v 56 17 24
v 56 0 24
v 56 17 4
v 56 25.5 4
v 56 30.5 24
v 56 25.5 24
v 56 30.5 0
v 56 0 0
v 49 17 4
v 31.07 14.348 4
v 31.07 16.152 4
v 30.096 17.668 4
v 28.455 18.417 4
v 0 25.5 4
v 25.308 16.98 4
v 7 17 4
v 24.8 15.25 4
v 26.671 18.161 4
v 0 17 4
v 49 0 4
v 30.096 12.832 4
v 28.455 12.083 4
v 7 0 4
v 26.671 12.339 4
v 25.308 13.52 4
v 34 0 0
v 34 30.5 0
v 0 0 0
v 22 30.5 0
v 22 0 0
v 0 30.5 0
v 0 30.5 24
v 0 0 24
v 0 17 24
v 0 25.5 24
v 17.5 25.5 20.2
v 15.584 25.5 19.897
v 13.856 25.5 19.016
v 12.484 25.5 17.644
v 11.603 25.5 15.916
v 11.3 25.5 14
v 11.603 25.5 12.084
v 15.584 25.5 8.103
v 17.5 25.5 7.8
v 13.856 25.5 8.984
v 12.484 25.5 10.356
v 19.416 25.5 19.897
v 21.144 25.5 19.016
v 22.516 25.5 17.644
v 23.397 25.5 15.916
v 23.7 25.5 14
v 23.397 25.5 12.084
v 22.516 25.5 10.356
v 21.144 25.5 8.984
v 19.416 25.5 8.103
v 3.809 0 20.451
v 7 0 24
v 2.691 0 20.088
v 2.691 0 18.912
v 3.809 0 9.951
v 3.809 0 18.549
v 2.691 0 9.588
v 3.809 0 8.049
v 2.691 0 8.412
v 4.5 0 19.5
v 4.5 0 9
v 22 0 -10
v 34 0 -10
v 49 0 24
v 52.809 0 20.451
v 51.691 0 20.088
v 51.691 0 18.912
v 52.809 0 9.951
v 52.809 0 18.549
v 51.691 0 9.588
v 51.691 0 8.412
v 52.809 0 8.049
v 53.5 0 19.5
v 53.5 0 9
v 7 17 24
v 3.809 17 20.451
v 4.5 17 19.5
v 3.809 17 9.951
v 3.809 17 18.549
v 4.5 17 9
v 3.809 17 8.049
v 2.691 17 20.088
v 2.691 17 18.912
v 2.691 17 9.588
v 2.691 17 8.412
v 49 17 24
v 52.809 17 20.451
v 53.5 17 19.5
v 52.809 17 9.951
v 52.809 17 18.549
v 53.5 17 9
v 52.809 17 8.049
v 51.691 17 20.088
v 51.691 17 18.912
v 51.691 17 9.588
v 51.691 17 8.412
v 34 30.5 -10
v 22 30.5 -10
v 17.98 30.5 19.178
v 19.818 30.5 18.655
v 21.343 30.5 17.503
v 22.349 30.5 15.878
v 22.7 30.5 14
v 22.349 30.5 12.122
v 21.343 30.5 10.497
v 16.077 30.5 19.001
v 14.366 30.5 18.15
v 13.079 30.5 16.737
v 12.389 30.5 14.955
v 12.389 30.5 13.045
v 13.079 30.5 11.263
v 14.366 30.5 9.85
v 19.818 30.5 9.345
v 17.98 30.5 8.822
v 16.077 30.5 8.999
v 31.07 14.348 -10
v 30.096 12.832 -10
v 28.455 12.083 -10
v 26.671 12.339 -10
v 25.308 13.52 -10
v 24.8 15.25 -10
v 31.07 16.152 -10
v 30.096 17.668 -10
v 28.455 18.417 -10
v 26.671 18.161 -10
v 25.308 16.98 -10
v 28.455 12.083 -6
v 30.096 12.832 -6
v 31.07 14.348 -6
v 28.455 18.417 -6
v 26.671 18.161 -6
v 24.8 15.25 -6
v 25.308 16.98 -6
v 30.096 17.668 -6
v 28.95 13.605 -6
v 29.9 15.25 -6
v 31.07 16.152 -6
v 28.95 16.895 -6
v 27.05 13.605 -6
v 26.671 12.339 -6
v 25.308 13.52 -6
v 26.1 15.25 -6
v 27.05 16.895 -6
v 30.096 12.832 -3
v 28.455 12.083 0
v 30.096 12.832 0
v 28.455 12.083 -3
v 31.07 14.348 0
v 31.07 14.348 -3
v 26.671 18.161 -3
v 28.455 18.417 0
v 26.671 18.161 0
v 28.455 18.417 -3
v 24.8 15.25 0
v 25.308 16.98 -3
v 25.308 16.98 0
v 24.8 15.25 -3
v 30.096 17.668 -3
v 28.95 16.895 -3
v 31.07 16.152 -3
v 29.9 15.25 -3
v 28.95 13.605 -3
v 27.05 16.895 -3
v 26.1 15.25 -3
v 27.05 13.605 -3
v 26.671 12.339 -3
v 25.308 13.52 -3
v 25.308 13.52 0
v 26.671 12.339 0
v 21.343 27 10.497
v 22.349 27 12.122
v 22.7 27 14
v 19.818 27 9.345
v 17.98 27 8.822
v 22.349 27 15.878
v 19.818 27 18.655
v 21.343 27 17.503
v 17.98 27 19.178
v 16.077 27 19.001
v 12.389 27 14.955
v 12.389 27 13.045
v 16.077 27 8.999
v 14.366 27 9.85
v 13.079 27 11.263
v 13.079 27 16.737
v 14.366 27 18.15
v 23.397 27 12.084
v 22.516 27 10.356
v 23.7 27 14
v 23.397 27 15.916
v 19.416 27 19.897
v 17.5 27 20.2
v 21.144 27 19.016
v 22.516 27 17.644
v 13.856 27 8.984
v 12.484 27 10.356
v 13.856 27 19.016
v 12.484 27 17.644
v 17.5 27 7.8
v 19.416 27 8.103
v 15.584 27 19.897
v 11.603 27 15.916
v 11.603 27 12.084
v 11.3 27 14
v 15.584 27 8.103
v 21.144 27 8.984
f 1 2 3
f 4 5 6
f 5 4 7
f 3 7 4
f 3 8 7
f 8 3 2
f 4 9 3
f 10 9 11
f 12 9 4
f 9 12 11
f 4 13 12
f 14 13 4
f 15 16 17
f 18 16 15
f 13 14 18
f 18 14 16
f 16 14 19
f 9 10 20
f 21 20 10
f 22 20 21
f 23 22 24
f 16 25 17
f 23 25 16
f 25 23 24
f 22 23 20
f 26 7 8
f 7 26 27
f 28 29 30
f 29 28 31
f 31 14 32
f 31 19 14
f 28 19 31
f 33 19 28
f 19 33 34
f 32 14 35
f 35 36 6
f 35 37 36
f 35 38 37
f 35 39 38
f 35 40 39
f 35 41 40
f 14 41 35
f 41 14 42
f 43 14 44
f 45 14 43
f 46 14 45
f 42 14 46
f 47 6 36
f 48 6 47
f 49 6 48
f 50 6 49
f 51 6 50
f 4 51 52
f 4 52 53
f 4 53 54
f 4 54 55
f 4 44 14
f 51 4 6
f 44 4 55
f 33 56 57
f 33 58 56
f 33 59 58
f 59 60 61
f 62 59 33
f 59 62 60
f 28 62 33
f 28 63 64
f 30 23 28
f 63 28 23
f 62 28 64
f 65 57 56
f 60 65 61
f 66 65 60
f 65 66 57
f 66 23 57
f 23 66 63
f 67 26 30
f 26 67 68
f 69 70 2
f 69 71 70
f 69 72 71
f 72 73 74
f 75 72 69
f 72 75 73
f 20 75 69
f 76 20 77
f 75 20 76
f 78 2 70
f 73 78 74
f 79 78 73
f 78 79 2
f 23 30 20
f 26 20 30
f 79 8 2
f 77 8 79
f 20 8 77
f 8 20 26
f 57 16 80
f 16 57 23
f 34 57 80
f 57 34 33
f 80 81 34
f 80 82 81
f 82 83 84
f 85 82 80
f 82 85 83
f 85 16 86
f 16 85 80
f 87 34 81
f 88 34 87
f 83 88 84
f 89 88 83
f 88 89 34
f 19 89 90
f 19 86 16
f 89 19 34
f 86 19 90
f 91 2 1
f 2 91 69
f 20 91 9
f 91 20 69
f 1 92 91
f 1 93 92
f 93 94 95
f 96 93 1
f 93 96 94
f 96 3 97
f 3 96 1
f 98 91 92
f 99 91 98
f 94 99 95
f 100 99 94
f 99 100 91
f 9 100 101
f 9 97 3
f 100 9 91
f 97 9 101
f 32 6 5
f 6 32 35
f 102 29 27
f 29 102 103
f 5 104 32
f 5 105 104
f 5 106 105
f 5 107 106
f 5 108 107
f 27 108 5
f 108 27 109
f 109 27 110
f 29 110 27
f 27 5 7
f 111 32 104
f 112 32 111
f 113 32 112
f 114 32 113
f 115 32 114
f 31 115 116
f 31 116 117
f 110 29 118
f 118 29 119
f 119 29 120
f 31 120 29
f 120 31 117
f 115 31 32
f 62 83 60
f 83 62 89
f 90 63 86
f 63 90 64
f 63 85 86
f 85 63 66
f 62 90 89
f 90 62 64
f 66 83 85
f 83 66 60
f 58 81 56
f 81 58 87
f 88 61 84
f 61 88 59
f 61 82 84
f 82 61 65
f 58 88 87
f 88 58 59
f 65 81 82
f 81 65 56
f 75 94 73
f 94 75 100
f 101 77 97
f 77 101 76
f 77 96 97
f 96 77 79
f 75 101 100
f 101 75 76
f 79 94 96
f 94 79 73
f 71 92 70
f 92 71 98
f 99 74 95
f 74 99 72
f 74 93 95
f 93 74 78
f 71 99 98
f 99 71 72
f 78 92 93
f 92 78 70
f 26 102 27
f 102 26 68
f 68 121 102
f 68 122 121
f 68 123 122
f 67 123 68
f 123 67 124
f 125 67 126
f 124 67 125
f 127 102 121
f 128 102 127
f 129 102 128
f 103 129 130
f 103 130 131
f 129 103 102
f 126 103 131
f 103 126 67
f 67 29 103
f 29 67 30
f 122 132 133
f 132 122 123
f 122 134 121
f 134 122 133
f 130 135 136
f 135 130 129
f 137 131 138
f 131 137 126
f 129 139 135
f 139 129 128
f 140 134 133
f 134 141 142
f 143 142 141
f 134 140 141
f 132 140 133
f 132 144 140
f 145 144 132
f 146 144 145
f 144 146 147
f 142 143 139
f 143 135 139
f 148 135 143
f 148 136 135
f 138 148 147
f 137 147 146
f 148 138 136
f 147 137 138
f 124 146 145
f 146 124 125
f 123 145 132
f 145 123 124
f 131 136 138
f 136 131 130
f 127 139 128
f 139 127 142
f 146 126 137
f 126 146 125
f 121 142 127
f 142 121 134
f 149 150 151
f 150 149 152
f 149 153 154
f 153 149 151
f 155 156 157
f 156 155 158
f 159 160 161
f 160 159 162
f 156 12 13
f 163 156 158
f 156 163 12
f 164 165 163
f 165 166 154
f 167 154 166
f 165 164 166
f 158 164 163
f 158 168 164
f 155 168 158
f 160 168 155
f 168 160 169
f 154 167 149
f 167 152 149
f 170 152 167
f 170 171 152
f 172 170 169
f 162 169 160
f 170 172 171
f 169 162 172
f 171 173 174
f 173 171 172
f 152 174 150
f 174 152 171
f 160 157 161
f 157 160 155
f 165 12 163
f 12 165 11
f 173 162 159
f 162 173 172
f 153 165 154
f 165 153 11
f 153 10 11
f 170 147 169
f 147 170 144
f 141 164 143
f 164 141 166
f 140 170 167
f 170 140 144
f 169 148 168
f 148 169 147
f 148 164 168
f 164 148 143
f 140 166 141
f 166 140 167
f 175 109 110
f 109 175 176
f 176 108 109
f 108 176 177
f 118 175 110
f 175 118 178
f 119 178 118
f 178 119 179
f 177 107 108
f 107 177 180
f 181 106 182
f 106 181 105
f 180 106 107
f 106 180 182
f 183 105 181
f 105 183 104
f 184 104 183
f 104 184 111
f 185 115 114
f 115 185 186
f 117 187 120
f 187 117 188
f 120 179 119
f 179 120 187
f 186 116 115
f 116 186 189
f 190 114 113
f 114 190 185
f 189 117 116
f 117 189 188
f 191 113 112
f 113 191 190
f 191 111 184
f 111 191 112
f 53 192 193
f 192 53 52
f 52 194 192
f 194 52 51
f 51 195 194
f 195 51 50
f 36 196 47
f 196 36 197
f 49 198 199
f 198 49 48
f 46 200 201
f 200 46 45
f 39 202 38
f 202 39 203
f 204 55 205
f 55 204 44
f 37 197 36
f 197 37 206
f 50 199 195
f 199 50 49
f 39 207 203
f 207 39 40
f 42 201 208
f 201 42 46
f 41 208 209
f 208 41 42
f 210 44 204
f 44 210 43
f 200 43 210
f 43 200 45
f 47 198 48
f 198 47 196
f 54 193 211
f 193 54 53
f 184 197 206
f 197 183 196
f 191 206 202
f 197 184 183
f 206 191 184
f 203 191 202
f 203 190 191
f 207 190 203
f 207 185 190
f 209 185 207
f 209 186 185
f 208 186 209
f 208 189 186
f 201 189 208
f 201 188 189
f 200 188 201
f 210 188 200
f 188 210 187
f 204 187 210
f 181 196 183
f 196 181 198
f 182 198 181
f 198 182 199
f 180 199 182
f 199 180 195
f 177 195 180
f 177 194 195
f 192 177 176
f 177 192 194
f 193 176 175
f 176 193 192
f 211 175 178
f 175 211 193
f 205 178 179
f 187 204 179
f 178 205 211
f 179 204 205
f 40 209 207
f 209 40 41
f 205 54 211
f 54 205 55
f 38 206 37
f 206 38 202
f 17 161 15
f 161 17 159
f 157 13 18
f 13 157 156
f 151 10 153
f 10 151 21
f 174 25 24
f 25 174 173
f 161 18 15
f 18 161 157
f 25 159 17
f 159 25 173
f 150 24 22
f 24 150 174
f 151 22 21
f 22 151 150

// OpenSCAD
// file: serv_box_1.scad
floor_l = 55+1;//len有误差，长度增加1.
floor_w = 17;//width
floor_h = 4;//height
wall_l = 7;//len
wall_h = 20;//height

back_wall = 8.5;
back_wall_w = 5;

//螺丝圆柱体
module screw(){
    screw_w = 2;
    rotate(a=[270,0,0]) cylinder(h=floor_w,d=screw_w);
}

//挖螺丝孔
module screw_hole(){
    //去掉螺丝孔
    //左侧
    translate([3.5,0,floor_h+5]) screw();
    translate([3.5,0,floor_h+5+10.5]) screw();
    //右侧
    translate([floor_l-3.5,0,floor_h+5]) screw();
    translate([floor_l-3.5,0,floor_h+5+10.5]) screw();
}

//法兰盘卡槽。
module flange_hole(){
    //法兰盘卡槽。
    flange_w = floor_w+back_wall;
    translate([17.5,0,floor_h+wall_h/2]) rotate(a=[270,0,0])  cylinder(h=flange_w+100,d=10.4);
    translate([17.5,0,floor_h+wall_h/2]) rotate(a=[270,0,0]) cylinder(h=flange_w+1.5,d=12.4);
}

module serv_box_1(){
    difference(){
        union(){
            //设置底座。
            cube(size=[floor_l,floor_w+back_wall,floor_h]);
            //设置左侧，放在底座上面。
            translate([0,0,floor_h]) cube(size=[wall_l,floor_w,wall_h]);
            //设置右侧，放在底座上面。
            translate([floor_l - wall_l ,0,floor_h]) cube(size=[wall_l,floor_w,wall_h]);
            //设置顶部
            //translate([0,0,wall_h+floor_h]) cube(size=[floor_l,floor_w,floor_h]);
            //设置侧面
            translate([0,floor_w++back_wall,0]) cube(size=[floor_l,back_wall_w,wall_h+floor_h]);
        }
        union(){
            //挖螺丝孔
            screw_hole()
            //底部挖空减轻重量
            translate([10,5,0]) cube(size=[floor_l-20,floor_w+back_wall_w-5,wall_h+floor_h*2]);

            //法兰盘卡槽。不在这里挖洞。
            //flange_hole();
        }
    }
}
//for test.
//serv_box_1();
// main file
//使用use，重复利用模型，不需要每次都画。
use <serv_box_1.scad>;

serv_l = 55+1;//len有误差，长度增加1.
serv_w = 30.5;

module serv_hole_a(){
    difference(){
        tmp_l = 10;
        translate([tmp_l/2,0,0]) rotate(a=[180,90,0]) cube([12,serv_w,tmp_l],center=true);
        //往里面挖 4mm 螺丝洞
        translate([tmp_l-4,0,0]) rotate(a=[0,90,0]) cylinder(h=4,d=5.9+0.5);//5.88//微调0.4
        //挖 3mm 舵机轴。
        translate([tmp_l-10,0,0]) rotate(a=[0,90,0]) cylinder(h=3,d=5.9+0.5);//5.88//微调0.4
        //螺丝口固定舵机
        translate([tmp_l-10,0,0]) rotate(a=[0,90,0]) cylinder(h=10,d=3.8);//3.8
    }
}

difference(){
    union(){
        //调用之前的舵机支架。移动到中心。
        serv_box_1();
        //移动到中心。
        translate([serv_l/2,serv_w/2,0]) rotate(a=[0,90,0]) serv_hole_a();
    }
    //挖舵机上面的洞。
    translate([serv_l/2,serv_w/2,10]) rotate(a=[0,90,0]) translate([10-4,0,0]) rotate(a=[0,90,0]) cylinder(h=4,d=5.9+0.5);//5.88//微调0.4
    
    //挖去法兰盘洞。
    flange_hole();
}
